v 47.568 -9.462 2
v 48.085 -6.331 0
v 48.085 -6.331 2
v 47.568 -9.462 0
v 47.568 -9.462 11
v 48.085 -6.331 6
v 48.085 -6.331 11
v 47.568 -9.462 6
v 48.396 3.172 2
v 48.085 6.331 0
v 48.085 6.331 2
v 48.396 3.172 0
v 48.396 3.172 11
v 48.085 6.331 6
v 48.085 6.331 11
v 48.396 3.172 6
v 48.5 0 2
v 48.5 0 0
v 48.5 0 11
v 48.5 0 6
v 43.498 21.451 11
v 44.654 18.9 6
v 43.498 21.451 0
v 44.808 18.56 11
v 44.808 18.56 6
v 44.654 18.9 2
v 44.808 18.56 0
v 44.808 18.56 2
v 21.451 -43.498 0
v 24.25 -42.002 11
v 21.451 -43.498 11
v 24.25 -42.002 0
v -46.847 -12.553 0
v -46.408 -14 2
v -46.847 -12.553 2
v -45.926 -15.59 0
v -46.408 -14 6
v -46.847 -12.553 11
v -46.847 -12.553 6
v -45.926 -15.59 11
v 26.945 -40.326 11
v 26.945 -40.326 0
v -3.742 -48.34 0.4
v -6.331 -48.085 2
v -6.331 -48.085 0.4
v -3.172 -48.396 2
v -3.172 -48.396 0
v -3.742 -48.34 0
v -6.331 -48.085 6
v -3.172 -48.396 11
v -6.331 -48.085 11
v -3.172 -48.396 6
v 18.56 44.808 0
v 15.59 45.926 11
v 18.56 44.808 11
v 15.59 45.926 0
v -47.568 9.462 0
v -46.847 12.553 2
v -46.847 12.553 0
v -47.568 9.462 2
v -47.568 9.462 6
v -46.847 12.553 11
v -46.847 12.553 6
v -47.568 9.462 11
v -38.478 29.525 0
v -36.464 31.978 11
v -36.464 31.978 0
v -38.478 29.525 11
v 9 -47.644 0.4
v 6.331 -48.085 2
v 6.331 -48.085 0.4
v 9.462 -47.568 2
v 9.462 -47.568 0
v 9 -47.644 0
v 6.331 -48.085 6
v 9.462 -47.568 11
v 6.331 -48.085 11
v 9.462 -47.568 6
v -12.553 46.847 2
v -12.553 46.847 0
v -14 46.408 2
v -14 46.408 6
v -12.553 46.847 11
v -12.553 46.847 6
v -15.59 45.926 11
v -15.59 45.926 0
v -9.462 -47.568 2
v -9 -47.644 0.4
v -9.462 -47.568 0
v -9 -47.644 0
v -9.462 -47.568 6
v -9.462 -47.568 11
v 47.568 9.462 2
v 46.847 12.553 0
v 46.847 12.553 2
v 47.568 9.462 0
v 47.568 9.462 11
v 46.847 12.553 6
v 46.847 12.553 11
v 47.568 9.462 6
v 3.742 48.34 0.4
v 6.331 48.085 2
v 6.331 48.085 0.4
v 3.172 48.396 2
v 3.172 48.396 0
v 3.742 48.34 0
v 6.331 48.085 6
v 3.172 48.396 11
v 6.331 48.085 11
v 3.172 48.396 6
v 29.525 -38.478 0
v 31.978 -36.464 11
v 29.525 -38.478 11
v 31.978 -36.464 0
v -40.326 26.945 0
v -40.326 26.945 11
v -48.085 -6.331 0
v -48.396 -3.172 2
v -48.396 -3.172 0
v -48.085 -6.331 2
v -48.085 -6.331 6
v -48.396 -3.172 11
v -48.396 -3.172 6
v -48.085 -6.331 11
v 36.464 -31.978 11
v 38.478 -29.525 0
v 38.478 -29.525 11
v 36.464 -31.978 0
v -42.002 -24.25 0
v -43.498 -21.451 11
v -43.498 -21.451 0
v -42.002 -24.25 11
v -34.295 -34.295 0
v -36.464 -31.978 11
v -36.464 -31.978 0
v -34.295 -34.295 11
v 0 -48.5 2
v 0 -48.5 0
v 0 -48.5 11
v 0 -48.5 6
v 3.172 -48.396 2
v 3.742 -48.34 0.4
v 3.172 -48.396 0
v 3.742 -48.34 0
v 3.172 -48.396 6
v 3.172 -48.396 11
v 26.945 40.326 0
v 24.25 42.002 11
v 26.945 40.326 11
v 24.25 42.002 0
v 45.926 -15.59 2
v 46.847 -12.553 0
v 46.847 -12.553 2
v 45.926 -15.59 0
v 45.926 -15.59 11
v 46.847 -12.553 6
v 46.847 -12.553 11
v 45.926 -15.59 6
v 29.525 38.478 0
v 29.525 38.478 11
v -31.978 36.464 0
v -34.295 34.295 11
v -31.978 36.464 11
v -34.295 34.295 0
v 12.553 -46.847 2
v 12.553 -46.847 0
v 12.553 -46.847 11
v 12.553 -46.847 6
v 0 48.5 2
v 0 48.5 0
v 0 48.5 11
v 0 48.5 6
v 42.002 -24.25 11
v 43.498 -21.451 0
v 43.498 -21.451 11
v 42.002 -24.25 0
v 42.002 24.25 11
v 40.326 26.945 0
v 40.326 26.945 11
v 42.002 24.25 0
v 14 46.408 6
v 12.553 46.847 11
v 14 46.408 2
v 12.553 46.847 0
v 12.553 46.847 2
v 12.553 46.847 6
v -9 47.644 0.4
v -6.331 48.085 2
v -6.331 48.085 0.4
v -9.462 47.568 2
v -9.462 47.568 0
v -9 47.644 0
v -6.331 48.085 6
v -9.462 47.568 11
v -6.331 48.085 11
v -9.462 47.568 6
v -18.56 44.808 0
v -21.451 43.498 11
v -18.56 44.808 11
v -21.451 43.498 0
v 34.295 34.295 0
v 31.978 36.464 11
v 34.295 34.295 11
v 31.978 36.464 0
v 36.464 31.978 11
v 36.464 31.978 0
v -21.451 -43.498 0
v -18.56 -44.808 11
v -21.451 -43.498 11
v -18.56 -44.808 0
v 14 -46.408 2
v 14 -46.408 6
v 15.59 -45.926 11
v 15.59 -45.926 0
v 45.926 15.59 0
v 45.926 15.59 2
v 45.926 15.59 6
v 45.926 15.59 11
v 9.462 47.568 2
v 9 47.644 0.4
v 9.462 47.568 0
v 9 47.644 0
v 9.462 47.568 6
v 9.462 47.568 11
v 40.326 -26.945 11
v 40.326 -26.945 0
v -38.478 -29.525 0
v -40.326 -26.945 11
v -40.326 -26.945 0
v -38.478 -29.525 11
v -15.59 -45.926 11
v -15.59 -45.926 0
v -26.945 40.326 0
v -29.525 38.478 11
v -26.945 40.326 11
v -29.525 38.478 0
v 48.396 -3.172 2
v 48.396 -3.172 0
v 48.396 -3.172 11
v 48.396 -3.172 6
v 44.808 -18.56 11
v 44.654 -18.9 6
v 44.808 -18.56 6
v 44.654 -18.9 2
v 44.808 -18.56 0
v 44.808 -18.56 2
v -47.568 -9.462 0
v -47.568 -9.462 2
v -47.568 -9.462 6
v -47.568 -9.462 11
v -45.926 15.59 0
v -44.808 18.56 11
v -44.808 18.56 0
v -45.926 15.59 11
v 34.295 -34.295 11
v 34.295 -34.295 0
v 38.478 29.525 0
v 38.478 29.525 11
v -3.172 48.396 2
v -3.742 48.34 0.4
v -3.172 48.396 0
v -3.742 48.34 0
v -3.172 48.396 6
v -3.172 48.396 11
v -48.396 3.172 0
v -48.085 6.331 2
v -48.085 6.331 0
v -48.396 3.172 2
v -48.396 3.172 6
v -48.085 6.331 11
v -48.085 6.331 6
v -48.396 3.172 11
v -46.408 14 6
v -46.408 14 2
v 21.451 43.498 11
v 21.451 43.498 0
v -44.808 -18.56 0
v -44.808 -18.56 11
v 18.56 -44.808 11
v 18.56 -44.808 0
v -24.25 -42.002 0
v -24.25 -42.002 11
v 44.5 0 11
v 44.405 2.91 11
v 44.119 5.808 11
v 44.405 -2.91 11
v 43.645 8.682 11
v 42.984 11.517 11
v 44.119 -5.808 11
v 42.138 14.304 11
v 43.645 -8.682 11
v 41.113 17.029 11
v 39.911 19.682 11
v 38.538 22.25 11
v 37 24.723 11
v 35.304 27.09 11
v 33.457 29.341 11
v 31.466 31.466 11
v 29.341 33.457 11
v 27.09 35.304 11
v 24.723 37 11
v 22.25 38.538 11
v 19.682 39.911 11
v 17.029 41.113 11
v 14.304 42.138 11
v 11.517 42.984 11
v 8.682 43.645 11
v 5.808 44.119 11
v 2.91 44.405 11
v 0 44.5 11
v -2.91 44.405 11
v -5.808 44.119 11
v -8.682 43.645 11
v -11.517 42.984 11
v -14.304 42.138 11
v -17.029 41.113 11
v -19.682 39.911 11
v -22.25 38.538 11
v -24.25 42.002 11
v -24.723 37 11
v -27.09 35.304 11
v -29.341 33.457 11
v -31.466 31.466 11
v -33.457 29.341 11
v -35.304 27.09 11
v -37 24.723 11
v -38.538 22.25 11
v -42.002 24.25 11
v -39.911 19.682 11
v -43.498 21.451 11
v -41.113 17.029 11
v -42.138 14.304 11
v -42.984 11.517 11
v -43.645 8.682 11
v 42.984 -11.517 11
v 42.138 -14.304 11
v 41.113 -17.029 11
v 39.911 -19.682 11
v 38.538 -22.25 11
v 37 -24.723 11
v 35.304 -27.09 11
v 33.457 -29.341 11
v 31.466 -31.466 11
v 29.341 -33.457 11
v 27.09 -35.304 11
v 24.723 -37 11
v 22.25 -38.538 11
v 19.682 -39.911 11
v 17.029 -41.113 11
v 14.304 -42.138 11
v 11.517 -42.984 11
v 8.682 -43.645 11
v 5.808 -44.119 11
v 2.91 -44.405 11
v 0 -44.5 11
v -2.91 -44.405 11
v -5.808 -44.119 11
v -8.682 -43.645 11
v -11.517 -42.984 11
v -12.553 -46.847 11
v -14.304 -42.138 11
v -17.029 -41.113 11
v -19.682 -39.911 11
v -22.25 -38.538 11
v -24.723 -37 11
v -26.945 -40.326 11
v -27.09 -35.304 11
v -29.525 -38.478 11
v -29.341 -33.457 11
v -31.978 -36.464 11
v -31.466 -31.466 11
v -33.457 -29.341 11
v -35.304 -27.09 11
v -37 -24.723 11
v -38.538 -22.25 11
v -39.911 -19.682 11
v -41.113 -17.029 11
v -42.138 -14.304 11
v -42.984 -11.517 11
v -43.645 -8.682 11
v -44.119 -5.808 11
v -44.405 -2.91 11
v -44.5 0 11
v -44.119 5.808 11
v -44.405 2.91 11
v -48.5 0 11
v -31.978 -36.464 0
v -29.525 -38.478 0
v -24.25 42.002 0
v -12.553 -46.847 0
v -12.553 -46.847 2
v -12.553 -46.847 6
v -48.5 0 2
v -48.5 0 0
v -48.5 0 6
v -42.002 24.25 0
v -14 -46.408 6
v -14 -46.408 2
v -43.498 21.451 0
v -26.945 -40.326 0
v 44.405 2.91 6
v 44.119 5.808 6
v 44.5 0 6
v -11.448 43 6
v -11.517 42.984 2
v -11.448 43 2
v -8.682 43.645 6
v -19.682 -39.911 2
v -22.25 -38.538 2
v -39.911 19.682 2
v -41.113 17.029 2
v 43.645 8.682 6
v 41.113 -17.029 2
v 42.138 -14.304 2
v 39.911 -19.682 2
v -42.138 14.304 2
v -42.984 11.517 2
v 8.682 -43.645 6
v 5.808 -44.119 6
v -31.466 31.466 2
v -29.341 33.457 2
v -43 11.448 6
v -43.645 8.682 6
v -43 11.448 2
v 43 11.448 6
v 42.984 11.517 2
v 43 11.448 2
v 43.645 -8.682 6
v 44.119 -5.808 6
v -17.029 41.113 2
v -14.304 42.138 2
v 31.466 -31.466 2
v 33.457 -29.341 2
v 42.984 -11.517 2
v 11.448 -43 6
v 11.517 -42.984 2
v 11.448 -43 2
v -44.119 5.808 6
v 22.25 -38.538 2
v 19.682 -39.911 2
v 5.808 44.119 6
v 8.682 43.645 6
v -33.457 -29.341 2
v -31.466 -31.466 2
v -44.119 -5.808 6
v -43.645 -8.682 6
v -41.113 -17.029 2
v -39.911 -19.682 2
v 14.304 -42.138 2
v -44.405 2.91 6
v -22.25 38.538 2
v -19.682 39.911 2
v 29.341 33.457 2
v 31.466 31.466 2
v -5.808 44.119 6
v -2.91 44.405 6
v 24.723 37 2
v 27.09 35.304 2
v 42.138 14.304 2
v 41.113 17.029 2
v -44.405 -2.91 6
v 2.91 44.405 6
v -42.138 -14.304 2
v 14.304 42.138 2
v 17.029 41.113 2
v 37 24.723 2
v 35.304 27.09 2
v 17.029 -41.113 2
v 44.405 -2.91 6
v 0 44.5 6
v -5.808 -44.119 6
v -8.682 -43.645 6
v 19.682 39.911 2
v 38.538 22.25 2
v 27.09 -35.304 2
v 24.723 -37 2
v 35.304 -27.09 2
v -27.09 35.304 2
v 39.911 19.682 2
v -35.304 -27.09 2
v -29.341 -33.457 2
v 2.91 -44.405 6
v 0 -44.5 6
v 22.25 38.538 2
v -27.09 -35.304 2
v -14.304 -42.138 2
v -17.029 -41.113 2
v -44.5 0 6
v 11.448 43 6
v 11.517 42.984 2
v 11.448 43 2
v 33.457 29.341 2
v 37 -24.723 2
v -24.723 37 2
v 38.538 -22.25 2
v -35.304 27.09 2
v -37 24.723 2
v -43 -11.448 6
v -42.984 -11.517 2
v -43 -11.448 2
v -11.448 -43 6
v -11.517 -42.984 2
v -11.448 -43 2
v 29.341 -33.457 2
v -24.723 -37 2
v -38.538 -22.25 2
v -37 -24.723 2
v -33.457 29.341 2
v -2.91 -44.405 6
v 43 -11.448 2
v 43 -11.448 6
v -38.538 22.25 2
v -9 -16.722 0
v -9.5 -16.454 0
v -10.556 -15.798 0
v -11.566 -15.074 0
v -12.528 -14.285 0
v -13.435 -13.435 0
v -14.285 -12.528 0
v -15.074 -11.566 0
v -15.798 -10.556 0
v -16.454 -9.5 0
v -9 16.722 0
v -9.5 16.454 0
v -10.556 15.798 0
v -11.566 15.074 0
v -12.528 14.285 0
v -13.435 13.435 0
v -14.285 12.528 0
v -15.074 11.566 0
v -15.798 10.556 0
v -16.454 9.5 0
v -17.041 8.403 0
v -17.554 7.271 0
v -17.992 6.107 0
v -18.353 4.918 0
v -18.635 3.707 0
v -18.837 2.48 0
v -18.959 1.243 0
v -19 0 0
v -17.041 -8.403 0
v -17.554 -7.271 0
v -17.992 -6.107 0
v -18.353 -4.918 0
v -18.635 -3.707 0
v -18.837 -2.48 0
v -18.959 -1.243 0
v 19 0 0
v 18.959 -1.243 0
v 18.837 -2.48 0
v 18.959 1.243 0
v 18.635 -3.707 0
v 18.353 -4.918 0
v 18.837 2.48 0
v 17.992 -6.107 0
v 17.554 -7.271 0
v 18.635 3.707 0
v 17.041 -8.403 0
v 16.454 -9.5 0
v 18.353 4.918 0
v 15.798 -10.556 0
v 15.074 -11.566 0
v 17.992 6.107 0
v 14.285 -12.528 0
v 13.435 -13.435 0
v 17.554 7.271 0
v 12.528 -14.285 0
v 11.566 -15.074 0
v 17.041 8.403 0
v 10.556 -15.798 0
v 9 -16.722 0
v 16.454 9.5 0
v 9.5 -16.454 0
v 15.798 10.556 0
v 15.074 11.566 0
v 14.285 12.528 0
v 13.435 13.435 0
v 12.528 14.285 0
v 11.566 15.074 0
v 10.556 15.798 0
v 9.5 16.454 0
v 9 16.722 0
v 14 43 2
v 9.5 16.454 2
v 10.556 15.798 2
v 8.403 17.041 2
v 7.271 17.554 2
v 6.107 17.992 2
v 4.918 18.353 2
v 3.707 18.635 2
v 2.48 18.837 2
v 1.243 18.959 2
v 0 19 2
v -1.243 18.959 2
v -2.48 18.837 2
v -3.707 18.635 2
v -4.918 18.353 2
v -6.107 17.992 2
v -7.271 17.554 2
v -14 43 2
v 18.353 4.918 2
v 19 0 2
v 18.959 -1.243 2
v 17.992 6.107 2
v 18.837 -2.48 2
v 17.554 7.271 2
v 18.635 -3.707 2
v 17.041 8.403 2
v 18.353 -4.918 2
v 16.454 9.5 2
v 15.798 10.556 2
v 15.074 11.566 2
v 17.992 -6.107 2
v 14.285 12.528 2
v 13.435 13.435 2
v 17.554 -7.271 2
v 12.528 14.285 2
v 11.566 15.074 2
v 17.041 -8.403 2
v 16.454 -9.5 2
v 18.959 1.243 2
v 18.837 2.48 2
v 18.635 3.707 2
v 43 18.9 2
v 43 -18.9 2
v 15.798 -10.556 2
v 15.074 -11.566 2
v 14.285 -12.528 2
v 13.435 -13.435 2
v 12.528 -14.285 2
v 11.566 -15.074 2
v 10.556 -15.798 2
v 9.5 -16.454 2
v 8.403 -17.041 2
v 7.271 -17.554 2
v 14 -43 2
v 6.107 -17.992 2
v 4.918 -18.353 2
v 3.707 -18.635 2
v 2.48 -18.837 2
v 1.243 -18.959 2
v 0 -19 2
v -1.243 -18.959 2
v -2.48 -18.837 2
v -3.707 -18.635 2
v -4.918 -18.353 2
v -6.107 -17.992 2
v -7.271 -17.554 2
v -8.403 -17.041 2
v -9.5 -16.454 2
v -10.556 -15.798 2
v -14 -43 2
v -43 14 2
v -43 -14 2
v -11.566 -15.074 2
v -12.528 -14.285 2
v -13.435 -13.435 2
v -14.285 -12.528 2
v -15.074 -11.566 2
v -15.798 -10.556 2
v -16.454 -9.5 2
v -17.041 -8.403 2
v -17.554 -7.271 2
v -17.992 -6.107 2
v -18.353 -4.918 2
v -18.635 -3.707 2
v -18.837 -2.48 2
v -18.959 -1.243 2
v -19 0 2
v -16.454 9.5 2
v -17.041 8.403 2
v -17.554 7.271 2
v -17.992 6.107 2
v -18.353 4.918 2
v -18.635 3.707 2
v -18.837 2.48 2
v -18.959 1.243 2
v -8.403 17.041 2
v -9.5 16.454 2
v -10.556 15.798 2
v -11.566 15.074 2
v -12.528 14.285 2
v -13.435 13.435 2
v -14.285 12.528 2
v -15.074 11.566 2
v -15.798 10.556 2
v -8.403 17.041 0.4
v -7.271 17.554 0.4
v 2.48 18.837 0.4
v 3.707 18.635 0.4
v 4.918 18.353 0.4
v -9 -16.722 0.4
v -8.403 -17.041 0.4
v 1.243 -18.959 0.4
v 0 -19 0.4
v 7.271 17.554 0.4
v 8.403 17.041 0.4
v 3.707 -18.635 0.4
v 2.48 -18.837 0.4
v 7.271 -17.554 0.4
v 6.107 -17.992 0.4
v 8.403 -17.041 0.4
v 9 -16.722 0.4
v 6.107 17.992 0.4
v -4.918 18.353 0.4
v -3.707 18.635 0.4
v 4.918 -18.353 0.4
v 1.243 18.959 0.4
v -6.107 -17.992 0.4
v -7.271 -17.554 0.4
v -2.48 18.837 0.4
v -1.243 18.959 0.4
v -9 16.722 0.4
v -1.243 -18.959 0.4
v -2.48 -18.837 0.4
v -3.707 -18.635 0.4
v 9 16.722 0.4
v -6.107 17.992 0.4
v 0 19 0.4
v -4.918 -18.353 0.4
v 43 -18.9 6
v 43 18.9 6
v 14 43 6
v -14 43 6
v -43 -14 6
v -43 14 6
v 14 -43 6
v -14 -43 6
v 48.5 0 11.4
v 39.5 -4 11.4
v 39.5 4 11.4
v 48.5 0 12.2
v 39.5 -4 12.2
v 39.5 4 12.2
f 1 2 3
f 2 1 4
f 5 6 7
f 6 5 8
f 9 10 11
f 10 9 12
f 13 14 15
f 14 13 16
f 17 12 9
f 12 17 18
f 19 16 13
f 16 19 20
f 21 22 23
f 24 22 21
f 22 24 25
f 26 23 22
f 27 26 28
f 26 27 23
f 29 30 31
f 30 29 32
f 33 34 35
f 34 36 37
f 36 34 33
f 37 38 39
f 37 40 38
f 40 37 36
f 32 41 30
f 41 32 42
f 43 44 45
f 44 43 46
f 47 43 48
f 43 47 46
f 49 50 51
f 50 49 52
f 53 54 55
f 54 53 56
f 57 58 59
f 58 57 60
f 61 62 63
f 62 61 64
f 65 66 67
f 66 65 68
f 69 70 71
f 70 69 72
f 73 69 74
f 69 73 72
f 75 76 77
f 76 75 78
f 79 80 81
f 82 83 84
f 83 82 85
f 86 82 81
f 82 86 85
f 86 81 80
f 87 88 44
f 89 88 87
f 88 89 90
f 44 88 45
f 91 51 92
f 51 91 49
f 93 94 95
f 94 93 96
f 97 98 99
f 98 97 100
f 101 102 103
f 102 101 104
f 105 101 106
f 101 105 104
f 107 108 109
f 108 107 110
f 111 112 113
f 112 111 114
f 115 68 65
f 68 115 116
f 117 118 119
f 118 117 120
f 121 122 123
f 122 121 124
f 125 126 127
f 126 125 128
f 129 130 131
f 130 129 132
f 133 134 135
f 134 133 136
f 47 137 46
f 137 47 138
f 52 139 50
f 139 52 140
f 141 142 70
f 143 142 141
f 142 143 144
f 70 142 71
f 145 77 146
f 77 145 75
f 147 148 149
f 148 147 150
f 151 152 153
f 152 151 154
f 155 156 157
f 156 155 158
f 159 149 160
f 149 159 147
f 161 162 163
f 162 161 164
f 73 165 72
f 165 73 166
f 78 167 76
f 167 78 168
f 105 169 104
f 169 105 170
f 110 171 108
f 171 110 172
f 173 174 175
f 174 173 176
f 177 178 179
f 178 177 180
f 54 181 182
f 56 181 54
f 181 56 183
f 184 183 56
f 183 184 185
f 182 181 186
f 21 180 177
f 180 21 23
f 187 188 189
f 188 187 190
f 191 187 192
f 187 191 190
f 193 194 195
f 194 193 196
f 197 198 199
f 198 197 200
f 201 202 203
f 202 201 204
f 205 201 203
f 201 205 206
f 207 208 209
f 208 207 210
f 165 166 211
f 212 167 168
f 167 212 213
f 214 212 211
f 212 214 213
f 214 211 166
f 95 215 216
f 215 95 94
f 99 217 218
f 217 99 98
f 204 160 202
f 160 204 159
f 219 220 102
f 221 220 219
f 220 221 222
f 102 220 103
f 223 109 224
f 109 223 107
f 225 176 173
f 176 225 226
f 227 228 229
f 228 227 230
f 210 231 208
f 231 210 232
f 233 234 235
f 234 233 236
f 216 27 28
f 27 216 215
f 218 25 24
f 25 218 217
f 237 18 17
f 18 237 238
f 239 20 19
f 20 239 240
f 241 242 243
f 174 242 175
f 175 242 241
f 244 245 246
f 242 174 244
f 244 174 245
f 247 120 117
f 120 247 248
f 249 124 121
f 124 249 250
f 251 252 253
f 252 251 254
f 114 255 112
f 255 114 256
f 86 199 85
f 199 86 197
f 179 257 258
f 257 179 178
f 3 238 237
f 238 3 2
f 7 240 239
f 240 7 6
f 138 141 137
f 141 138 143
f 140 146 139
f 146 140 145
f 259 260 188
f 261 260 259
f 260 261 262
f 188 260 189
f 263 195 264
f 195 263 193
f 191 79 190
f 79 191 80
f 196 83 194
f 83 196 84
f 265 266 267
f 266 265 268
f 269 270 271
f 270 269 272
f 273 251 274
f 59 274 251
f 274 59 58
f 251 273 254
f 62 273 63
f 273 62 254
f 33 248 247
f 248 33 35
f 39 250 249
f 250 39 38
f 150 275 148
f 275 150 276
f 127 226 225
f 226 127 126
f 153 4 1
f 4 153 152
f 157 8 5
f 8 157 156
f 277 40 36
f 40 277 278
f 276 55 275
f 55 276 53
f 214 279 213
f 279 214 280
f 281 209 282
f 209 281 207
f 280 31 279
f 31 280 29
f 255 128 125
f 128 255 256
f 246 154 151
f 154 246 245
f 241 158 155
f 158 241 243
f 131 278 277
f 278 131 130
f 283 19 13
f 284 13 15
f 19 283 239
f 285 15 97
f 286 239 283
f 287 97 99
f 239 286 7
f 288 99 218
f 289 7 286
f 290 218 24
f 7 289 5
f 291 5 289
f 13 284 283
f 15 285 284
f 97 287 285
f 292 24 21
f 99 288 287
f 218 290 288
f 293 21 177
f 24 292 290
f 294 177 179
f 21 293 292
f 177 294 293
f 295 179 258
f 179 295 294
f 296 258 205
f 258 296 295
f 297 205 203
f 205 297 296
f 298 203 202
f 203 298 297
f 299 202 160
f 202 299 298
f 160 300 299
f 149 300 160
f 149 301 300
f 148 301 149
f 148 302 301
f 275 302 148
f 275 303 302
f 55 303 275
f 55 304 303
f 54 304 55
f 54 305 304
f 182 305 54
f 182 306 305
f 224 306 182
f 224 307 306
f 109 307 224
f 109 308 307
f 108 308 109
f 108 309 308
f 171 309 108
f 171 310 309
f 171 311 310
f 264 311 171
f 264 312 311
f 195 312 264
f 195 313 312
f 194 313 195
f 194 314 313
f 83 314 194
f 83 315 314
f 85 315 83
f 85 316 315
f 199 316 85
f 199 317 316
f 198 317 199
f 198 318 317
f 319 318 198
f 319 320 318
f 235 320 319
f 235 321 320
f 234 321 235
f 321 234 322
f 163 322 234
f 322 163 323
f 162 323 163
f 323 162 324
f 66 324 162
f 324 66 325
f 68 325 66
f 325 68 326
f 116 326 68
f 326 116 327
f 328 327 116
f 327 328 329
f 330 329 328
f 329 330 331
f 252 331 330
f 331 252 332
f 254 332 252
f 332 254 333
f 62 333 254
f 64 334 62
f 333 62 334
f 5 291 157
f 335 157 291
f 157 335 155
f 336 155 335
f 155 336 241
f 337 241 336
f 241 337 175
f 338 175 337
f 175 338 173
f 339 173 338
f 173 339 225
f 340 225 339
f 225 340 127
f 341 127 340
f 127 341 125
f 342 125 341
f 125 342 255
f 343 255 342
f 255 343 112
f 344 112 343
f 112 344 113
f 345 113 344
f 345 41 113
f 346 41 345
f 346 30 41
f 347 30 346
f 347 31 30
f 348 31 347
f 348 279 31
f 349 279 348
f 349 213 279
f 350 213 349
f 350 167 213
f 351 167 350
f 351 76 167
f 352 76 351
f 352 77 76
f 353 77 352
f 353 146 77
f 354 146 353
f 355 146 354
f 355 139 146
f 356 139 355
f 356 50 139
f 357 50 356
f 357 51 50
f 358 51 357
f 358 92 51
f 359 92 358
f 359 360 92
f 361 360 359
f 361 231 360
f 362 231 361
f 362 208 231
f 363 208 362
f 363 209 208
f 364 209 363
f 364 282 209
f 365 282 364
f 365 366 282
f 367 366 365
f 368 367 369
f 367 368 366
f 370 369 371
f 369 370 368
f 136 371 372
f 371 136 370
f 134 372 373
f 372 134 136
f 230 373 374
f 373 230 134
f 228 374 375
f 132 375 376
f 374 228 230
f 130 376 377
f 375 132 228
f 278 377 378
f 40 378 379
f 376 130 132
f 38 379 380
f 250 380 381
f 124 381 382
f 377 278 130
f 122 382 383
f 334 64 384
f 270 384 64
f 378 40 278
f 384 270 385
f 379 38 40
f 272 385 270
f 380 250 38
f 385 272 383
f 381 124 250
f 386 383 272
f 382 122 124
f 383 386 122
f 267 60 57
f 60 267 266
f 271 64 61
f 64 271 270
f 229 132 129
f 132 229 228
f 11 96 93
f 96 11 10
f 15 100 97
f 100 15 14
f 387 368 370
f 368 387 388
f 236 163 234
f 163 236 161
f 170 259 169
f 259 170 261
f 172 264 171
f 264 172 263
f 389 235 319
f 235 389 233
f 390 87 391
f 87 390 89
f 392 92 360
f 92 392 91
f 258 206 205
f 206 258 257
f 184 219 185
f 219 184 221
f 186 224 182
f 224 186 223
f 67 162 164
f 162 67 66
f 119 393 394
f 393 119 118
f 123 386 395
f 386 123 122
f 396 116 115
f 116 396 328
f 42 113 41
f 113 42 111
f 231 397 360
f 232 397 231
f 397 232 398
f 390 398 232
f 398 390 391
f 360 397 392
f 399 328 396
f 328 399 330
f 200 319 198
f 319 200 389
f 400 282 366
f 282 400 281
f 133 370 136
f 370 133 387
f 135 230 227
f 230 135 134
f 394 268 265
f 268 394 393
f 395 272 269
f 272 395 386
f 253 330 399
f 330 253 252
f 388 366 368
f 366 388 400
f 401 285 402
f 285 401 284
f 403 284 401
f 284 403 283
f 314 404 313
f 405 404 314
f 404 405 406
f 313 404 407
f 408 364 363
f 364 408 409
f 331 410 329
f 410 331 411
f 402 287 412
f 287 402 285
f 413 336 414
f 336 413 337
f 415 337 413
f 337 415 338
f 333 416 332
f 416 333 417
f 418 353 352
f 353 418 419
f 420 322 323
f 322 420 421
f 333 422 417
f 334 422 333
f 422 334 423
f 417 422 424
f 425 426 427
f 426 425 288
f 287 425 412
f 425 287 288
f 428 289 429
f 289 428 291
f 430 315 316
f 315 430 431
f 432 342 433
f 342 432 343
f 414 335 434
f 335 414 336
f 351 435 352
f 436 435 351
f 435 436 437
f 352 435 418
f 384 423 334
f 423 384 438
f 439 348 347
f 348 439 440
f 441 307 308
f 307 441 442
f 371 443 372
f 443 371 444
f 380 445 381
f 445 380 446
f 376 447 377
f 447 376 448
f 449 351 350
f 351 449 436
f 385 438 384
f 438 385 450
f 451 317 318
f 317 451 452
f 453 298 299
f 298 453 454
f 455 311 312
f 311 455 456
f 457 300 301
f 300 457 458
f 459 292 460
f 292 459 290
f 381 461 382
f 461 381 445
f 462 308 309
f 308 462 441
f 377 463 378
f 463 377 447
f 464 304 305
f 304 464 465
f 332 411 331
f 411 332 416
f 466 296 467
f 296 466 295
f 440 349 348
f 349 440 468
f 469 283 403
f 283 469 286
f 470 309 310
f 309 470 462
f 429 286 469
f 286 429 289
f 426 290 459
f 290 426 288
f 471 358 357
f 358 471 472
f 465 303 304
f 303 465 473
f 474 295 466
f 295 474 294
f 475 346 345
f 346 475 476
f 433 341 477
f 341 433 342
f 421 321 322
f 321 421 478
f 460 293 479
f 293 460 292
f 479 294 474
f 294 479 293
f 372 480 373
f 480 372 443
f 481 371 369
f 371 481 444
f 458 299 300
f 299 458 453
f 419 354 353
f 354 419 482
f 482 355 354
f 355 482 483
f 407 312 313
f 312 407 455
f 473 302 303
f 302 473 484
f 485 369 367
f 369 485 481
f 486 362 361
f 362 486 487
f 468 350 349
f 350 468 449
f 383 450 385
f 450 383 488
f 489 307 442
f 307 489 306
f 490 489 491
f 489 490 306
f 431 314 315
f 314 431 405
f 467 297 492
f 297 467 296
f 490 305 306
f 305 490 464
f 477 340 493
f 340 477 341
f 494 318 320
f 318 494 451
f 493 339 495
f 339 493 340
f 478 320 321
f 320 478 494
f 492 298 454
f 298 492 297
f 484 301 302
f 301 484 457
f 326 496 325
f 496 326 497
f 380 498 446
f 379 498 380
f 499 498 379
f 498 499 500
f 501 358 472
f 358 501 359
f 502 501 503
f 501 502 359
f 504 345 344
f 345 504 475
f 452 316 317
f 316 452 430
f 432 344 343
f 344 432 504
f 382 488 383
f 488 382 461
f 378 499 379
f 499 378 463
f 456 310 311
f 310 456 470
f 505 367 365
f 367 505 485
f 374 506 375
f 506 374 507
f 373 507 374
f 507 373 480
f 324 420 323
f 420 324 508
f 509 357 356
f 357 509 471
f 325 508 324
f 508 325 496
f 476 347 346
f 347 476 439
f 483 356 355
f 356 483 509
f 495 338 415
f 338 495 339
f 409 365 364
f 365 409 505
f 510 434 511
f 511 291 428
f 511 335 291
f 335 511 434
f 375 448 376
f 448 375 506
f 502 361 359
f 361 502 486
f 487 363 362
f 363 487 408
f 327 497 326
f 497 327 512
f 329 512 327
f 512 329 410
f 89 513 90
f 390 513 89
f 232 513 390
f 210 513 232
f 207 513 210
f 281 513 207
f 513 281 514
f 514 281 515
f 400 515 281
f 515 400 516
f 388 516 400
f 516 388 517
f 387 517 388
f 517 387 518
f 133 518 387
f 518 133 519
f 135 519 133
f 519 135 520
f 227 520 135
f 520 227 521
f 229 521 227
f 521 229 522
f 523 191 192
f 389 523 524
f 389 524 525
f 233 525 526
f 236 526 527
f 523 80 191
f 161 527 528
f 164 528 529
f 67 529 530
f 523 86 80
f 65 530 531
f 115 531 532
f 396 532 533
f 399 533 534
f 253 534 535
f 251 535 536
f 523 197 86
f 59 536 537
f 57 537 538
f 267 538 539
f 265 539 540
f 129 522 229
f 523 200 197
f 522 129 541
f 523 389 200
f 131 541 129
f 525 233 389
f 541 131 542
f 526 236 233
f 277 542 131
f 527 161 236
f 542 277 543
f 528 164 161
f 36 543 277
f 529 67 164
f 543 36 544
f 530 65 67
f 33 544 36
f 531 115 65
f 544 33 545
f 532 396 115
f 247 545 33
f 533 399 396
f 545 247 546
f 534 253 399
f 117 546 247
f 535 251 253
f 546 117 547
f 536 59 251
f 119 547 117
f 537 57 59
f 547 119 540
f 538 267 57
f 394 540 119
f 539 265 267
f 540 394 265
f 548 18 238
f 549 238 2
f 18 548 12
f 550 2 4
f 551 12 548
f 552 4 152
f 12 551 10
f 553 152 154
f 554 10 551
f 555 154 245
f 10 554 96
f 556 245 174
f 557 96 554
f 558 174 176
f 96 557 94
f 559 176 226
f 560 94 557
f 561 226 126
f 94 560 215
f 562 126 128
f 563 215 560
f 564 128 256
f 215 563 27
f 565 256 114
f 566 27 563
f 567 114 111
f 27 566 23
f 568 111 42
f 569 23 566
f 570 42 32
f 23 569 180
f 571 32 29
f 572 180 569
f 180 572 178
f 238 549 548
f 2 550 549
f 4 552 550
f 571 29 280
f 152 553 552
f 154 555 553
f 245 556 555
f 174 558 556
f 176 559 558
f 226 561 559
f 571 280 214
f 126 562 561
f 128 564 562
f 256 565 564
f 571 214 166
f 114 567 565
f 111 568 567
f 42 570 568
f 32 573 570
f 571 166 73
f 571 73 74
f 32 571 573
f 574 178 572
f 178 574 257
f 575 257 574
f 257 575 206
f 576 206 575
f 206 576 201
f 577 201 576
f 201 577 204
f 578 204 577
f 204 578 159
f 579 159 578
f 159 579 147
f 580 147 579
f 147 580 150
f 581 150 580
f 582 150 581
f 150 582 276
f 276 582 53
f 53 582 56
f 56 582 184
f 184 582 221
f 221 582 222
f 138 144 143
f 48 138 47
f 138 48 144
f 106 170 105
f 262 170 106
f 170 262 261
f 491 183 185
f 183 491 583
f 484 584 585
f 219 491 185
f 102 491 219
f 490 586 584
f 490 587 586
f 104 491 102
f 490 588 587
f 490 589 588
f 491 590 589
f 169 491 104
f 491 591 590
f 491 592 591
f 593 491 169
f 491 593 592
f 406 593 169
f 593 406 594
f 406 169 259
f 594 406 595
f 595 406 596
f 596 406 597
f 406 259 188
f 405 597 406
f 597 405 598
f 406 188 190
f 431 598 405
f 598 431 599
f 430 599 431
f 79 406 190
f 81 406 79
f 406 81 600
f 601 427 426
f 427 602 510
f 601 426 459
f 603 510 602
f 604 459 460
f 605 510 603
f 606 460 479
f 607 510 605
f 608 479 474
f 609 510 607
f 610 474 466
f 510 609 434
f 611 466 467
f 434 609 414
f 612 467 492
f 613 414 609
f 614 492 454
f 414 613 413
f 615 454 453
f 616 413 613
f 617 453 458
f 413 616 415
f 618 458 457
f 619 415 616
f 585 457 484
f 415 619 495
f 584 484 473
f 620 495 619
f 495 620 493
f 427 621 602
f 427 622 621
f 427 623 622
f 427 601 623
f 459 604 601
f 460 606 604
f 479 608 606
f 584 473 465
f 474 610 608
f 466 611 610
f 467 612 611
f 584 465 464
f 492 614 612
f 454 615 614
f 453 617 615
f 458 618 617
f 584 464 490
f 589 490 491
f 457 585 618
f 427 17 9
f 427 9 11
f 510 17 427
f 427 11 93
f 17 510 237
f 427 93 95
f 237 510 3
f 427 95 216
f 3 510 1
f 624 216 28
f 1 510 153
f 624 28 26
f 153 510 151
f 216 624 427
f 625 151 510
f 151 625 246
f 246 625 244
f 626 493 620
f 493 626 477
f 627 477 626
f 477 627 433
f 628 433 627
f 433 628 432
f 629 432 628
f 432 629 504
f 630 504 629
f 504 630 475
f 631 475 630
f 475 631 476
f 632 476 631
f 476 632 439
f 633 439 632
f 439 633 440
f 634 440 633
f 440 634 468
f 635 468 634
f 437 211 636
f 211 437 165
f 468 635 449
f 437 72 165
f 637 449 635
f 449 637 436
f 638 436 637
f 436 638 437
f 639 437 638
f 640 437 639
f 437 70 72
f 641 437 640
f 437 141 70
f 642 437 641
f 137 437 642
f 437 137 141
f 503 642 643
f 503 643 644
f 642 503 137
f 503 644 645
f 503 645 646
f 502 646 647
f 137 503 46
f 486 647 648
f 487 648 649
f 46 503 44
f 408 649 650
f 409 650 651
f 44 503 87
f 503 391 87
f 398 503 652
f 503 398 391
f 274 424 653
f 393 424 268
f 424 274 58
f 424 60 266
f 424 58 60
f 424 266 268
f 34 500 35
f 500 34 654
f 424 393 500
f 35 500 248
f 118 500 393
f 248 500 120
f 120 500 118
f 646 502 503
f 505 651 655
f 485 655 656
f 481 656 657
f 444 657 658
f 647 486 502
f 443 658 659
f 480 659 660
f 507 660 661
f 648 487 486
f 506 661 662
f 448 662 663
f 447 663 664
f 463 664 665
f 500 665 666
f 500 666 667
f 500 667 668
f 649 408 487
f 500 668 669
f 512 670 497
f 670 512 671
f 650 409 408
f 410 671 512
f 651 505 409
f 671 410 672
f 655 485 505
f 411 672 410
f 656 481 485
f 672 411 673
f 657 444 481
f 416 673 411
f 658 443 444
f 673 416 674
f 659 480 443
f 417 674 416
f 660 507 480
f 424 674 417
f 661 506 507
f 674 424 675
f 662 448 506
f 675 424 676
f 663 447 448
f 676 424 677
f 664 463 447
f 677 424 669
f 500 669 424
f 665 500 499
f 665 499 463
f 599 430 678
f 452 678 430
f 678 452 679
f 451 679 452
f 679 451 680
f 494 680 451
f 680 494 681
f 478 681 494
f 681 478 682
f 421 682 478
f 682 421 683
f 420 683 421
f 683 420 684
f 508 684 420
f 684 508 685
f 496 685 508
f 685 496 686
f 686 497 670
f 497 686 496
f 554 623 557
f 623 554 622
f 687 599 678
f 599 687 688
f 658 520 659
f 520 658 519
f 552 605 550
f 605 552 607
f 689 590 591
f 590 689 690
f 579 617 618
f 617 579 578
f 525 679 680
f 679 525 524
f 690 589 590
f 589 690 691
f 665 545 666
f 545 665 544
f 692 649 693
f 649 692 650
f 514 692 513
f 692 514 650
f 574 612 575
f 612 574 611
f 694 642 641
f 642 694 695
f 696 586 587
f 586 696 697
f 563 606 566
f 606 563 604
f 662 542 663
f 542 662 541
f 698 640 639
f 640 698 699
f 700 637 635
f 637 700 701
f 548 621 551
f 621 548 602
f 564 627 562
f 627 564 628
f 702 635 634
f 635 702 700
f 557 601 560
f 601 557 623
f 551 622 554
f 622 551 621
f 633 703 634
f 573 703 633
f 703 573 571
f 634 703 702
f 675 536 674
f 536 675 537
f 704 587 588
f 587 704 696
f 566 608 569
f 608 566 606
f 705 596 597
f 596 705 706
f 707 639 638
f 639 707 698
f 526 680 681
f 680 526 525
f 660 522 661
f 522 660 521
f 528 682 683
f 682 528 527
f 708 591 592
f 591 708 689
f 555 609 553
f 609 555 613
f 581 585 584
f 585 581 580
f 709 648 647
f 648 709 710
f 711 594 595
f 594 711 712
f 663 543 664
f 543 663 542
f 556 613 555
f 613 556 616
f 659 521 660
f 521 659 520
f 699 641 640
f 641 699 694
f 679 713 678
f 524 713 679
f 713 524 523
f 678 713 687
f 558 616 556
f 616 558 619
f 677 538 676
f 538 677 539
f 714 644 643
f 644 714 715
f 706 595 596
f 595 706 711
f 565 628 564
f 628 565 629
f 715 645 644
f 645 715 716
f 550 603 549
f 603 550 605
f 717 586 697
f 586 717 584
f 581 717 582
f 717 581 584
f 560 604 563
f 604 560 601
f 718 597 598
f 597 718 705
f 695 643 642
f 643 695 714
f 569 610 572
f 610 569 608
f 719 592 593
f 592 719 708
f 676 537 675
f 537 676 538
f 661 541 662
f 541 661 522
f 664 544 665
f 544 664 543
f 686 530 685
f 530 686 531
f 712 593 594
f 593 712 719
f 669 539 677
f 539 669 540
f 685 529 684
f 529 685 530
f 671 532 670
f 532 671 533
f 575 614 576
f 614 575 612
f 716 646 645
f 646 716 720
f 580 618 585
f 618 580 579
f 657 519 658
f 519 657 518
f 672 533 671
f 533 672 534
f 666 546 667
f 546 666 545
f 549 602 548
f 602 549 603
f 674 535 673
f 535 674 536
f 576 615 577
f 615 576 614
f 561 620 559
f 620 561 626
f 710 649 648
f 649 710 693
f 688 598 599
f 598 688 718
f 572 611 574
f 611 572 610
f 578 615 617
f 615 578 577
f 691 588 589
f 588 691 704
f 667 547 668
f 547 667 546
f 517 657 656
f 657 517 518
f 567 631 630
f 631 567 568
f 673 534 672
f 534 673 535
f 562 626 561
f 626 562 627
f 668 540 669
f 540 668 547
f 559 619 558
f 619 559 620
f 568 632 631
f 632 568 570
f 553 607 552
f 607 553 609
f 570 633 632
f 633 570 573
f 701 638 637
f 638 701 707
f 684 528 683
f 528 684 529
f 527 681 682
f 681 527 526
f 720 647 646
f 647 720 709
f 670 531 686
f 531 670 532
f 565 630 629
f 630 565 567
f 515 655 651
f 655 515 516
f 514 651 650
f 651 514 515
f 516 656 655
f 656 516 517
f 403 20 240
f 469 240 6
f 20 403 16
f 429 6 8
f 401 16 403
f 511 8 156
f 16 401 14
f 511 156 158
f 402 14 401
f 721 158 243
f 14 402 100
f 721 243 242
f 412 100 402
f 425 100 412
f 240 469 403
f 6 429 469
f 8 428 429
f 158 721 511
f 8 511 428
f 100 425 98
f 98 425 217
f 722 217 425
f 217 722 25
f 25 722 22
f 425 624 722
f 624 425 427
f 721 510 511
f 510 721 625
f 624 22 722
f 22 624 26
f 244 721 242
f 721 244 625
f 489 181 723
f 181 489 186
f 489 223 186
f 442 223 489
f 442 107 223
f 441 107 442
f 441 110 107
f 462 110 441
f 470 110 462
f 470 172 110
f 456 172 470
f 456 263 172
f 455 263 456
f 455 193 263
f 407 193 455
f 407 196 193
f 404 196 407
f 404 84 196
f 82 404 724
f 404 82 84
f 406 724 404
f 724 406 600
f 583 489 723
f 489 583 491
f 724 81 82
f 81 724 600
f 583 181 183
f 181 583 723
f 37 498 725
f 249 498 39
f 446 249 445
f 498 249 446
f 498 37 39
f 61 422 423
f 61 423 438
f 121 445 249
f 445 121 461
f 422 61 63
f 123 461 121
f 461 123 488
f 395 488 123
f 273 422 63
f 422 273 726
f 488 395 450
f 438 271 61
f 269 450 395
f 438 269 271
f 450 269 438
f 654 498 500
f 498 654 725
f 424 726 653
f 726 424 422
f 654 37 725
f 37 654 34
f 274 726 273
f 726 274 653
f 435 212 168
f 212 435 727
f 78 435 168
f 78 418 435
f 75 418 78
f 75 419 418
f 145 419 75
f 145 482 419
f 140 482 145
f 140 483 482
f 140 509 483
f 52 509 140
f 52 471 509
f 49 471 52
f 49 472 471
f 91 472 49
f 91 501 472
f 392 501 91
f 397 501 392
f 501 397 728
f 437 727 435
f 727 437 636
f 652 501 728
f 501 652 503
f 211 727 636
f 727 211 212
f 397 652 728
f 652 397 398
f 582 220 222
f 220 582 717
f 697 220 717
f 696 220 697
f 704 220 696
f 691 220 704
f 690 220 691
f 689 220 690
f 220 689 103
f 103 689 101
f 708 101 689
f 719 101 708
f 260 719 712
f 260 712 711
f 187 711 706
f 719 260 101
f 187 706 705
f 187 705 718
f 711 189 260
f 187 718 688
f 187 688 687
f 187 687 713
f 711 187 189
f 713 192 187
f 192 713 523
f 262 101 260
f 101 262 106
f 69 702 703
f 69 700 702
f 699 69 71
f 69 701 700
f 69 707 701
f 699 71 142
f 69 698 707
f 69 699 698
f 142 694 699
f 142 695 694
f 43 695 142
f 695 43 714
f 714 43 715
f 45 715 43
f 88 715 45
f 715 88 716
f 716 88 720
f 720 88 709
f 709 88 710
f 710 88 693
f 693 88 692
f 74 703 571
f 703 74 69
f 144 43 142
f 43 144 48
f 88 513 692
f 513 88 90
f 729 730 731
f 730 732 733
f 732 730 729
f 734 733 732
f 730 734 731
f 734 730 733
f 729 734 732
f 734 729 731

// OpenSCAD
// Talking Pet Buttons - parametric sound riser
// Open in OpenSCAD, adjust button_diameter and export STL.

$fn = 96;

button_diameter = 88;      // mm, measure the bottom of the recordable button
inner_clearance = 1.0;     // mm
outer_wall = 4.0;          // mm
riser_height = 8.0;        // mm
floor_thickness = 2.0;     // mm
lip_height = 3.0;          // mm
lip_thickness = 2.2;       // mm
speaker_hole_diameter = 38;
side_vent_width = 28;
side_vent_height = 4.0;
velcro_recess_depth = 0.8;
velcro_recess_width = 18;
velcro_recess_length = 54;

inner_diameter = button_diameter + inner_clearance;
outer_diameter = inner_diameter + outer_wall * 2;
total_height = riser_height + lip_height;

module rounded_cylinder(d, h) {
  cylinder(d = d, h = h);
}

module side_vent(angle, width, height) {
  rotate([0, 0, angle])
    translate([outer_diameter / 2 - outer_wall / 2, 0, floor_thickness + height / 2])
      cube([outer_wall + 3, width, height], center = true);
}

module velcro_recess(angle) {
  rotate([0, 0, angle])
    translate([0, outer_diameter * 0.22, -0.01])
      cube([velcro_recess_width, velcro_recess_length, velcro_recess_depth + 0.02], center = true);
}

difference() {
  union() {
    // Base disk that lifts the button away from the yoga tile.
    rounded_cylinder(outer_diameter, riser_height);

    // Low retaining lip. It keeps the button centered without trapping sound.
    difference() {
      translate([0, 0, riser_height])
        rounded_cylinder(outer_diameter, lip_height);
      translate([0, 0, riser_height - 0.1])
        rounded_cylinder(inner_diameter, lip_height + 0.3);
    }
  }

  // Main cavity for the button bottom.
  translate([0, 0, floor_thickness])
    rounded_cylinder(inner_diameter, total_height + 0.2);

  // Speaker relief hole under the button.
  translate([0, 0, -0.1])
    rounded_cylinder(speaker_hole_diameter, floor_thickness + 0.3);

  // One larger front vent should face the microphone.
  side_vent(0, side_vent_width * 1.35, side_vent_height);

  // Three secondary vents.
  side_vent(90, side_vent_width, side_vent_height);
  side_vent(180, side_vent_width, side_vent_height);
  side_vent(270, side_vent_width, side_vent_height);

  // Optional shallow recesses for Velcro or rubber pads underneath.
  velcro_recess(0);
  velcro_recess(180);
}

// Orientation marker: this notch points toward the microphone.
translate([outer_diameter / 2 - 5, 0, total_height + 0.4])
  linear_extrude(0.8)
    polygon(points = [[-4, -4], [5, 0], [-4, 4]]);
